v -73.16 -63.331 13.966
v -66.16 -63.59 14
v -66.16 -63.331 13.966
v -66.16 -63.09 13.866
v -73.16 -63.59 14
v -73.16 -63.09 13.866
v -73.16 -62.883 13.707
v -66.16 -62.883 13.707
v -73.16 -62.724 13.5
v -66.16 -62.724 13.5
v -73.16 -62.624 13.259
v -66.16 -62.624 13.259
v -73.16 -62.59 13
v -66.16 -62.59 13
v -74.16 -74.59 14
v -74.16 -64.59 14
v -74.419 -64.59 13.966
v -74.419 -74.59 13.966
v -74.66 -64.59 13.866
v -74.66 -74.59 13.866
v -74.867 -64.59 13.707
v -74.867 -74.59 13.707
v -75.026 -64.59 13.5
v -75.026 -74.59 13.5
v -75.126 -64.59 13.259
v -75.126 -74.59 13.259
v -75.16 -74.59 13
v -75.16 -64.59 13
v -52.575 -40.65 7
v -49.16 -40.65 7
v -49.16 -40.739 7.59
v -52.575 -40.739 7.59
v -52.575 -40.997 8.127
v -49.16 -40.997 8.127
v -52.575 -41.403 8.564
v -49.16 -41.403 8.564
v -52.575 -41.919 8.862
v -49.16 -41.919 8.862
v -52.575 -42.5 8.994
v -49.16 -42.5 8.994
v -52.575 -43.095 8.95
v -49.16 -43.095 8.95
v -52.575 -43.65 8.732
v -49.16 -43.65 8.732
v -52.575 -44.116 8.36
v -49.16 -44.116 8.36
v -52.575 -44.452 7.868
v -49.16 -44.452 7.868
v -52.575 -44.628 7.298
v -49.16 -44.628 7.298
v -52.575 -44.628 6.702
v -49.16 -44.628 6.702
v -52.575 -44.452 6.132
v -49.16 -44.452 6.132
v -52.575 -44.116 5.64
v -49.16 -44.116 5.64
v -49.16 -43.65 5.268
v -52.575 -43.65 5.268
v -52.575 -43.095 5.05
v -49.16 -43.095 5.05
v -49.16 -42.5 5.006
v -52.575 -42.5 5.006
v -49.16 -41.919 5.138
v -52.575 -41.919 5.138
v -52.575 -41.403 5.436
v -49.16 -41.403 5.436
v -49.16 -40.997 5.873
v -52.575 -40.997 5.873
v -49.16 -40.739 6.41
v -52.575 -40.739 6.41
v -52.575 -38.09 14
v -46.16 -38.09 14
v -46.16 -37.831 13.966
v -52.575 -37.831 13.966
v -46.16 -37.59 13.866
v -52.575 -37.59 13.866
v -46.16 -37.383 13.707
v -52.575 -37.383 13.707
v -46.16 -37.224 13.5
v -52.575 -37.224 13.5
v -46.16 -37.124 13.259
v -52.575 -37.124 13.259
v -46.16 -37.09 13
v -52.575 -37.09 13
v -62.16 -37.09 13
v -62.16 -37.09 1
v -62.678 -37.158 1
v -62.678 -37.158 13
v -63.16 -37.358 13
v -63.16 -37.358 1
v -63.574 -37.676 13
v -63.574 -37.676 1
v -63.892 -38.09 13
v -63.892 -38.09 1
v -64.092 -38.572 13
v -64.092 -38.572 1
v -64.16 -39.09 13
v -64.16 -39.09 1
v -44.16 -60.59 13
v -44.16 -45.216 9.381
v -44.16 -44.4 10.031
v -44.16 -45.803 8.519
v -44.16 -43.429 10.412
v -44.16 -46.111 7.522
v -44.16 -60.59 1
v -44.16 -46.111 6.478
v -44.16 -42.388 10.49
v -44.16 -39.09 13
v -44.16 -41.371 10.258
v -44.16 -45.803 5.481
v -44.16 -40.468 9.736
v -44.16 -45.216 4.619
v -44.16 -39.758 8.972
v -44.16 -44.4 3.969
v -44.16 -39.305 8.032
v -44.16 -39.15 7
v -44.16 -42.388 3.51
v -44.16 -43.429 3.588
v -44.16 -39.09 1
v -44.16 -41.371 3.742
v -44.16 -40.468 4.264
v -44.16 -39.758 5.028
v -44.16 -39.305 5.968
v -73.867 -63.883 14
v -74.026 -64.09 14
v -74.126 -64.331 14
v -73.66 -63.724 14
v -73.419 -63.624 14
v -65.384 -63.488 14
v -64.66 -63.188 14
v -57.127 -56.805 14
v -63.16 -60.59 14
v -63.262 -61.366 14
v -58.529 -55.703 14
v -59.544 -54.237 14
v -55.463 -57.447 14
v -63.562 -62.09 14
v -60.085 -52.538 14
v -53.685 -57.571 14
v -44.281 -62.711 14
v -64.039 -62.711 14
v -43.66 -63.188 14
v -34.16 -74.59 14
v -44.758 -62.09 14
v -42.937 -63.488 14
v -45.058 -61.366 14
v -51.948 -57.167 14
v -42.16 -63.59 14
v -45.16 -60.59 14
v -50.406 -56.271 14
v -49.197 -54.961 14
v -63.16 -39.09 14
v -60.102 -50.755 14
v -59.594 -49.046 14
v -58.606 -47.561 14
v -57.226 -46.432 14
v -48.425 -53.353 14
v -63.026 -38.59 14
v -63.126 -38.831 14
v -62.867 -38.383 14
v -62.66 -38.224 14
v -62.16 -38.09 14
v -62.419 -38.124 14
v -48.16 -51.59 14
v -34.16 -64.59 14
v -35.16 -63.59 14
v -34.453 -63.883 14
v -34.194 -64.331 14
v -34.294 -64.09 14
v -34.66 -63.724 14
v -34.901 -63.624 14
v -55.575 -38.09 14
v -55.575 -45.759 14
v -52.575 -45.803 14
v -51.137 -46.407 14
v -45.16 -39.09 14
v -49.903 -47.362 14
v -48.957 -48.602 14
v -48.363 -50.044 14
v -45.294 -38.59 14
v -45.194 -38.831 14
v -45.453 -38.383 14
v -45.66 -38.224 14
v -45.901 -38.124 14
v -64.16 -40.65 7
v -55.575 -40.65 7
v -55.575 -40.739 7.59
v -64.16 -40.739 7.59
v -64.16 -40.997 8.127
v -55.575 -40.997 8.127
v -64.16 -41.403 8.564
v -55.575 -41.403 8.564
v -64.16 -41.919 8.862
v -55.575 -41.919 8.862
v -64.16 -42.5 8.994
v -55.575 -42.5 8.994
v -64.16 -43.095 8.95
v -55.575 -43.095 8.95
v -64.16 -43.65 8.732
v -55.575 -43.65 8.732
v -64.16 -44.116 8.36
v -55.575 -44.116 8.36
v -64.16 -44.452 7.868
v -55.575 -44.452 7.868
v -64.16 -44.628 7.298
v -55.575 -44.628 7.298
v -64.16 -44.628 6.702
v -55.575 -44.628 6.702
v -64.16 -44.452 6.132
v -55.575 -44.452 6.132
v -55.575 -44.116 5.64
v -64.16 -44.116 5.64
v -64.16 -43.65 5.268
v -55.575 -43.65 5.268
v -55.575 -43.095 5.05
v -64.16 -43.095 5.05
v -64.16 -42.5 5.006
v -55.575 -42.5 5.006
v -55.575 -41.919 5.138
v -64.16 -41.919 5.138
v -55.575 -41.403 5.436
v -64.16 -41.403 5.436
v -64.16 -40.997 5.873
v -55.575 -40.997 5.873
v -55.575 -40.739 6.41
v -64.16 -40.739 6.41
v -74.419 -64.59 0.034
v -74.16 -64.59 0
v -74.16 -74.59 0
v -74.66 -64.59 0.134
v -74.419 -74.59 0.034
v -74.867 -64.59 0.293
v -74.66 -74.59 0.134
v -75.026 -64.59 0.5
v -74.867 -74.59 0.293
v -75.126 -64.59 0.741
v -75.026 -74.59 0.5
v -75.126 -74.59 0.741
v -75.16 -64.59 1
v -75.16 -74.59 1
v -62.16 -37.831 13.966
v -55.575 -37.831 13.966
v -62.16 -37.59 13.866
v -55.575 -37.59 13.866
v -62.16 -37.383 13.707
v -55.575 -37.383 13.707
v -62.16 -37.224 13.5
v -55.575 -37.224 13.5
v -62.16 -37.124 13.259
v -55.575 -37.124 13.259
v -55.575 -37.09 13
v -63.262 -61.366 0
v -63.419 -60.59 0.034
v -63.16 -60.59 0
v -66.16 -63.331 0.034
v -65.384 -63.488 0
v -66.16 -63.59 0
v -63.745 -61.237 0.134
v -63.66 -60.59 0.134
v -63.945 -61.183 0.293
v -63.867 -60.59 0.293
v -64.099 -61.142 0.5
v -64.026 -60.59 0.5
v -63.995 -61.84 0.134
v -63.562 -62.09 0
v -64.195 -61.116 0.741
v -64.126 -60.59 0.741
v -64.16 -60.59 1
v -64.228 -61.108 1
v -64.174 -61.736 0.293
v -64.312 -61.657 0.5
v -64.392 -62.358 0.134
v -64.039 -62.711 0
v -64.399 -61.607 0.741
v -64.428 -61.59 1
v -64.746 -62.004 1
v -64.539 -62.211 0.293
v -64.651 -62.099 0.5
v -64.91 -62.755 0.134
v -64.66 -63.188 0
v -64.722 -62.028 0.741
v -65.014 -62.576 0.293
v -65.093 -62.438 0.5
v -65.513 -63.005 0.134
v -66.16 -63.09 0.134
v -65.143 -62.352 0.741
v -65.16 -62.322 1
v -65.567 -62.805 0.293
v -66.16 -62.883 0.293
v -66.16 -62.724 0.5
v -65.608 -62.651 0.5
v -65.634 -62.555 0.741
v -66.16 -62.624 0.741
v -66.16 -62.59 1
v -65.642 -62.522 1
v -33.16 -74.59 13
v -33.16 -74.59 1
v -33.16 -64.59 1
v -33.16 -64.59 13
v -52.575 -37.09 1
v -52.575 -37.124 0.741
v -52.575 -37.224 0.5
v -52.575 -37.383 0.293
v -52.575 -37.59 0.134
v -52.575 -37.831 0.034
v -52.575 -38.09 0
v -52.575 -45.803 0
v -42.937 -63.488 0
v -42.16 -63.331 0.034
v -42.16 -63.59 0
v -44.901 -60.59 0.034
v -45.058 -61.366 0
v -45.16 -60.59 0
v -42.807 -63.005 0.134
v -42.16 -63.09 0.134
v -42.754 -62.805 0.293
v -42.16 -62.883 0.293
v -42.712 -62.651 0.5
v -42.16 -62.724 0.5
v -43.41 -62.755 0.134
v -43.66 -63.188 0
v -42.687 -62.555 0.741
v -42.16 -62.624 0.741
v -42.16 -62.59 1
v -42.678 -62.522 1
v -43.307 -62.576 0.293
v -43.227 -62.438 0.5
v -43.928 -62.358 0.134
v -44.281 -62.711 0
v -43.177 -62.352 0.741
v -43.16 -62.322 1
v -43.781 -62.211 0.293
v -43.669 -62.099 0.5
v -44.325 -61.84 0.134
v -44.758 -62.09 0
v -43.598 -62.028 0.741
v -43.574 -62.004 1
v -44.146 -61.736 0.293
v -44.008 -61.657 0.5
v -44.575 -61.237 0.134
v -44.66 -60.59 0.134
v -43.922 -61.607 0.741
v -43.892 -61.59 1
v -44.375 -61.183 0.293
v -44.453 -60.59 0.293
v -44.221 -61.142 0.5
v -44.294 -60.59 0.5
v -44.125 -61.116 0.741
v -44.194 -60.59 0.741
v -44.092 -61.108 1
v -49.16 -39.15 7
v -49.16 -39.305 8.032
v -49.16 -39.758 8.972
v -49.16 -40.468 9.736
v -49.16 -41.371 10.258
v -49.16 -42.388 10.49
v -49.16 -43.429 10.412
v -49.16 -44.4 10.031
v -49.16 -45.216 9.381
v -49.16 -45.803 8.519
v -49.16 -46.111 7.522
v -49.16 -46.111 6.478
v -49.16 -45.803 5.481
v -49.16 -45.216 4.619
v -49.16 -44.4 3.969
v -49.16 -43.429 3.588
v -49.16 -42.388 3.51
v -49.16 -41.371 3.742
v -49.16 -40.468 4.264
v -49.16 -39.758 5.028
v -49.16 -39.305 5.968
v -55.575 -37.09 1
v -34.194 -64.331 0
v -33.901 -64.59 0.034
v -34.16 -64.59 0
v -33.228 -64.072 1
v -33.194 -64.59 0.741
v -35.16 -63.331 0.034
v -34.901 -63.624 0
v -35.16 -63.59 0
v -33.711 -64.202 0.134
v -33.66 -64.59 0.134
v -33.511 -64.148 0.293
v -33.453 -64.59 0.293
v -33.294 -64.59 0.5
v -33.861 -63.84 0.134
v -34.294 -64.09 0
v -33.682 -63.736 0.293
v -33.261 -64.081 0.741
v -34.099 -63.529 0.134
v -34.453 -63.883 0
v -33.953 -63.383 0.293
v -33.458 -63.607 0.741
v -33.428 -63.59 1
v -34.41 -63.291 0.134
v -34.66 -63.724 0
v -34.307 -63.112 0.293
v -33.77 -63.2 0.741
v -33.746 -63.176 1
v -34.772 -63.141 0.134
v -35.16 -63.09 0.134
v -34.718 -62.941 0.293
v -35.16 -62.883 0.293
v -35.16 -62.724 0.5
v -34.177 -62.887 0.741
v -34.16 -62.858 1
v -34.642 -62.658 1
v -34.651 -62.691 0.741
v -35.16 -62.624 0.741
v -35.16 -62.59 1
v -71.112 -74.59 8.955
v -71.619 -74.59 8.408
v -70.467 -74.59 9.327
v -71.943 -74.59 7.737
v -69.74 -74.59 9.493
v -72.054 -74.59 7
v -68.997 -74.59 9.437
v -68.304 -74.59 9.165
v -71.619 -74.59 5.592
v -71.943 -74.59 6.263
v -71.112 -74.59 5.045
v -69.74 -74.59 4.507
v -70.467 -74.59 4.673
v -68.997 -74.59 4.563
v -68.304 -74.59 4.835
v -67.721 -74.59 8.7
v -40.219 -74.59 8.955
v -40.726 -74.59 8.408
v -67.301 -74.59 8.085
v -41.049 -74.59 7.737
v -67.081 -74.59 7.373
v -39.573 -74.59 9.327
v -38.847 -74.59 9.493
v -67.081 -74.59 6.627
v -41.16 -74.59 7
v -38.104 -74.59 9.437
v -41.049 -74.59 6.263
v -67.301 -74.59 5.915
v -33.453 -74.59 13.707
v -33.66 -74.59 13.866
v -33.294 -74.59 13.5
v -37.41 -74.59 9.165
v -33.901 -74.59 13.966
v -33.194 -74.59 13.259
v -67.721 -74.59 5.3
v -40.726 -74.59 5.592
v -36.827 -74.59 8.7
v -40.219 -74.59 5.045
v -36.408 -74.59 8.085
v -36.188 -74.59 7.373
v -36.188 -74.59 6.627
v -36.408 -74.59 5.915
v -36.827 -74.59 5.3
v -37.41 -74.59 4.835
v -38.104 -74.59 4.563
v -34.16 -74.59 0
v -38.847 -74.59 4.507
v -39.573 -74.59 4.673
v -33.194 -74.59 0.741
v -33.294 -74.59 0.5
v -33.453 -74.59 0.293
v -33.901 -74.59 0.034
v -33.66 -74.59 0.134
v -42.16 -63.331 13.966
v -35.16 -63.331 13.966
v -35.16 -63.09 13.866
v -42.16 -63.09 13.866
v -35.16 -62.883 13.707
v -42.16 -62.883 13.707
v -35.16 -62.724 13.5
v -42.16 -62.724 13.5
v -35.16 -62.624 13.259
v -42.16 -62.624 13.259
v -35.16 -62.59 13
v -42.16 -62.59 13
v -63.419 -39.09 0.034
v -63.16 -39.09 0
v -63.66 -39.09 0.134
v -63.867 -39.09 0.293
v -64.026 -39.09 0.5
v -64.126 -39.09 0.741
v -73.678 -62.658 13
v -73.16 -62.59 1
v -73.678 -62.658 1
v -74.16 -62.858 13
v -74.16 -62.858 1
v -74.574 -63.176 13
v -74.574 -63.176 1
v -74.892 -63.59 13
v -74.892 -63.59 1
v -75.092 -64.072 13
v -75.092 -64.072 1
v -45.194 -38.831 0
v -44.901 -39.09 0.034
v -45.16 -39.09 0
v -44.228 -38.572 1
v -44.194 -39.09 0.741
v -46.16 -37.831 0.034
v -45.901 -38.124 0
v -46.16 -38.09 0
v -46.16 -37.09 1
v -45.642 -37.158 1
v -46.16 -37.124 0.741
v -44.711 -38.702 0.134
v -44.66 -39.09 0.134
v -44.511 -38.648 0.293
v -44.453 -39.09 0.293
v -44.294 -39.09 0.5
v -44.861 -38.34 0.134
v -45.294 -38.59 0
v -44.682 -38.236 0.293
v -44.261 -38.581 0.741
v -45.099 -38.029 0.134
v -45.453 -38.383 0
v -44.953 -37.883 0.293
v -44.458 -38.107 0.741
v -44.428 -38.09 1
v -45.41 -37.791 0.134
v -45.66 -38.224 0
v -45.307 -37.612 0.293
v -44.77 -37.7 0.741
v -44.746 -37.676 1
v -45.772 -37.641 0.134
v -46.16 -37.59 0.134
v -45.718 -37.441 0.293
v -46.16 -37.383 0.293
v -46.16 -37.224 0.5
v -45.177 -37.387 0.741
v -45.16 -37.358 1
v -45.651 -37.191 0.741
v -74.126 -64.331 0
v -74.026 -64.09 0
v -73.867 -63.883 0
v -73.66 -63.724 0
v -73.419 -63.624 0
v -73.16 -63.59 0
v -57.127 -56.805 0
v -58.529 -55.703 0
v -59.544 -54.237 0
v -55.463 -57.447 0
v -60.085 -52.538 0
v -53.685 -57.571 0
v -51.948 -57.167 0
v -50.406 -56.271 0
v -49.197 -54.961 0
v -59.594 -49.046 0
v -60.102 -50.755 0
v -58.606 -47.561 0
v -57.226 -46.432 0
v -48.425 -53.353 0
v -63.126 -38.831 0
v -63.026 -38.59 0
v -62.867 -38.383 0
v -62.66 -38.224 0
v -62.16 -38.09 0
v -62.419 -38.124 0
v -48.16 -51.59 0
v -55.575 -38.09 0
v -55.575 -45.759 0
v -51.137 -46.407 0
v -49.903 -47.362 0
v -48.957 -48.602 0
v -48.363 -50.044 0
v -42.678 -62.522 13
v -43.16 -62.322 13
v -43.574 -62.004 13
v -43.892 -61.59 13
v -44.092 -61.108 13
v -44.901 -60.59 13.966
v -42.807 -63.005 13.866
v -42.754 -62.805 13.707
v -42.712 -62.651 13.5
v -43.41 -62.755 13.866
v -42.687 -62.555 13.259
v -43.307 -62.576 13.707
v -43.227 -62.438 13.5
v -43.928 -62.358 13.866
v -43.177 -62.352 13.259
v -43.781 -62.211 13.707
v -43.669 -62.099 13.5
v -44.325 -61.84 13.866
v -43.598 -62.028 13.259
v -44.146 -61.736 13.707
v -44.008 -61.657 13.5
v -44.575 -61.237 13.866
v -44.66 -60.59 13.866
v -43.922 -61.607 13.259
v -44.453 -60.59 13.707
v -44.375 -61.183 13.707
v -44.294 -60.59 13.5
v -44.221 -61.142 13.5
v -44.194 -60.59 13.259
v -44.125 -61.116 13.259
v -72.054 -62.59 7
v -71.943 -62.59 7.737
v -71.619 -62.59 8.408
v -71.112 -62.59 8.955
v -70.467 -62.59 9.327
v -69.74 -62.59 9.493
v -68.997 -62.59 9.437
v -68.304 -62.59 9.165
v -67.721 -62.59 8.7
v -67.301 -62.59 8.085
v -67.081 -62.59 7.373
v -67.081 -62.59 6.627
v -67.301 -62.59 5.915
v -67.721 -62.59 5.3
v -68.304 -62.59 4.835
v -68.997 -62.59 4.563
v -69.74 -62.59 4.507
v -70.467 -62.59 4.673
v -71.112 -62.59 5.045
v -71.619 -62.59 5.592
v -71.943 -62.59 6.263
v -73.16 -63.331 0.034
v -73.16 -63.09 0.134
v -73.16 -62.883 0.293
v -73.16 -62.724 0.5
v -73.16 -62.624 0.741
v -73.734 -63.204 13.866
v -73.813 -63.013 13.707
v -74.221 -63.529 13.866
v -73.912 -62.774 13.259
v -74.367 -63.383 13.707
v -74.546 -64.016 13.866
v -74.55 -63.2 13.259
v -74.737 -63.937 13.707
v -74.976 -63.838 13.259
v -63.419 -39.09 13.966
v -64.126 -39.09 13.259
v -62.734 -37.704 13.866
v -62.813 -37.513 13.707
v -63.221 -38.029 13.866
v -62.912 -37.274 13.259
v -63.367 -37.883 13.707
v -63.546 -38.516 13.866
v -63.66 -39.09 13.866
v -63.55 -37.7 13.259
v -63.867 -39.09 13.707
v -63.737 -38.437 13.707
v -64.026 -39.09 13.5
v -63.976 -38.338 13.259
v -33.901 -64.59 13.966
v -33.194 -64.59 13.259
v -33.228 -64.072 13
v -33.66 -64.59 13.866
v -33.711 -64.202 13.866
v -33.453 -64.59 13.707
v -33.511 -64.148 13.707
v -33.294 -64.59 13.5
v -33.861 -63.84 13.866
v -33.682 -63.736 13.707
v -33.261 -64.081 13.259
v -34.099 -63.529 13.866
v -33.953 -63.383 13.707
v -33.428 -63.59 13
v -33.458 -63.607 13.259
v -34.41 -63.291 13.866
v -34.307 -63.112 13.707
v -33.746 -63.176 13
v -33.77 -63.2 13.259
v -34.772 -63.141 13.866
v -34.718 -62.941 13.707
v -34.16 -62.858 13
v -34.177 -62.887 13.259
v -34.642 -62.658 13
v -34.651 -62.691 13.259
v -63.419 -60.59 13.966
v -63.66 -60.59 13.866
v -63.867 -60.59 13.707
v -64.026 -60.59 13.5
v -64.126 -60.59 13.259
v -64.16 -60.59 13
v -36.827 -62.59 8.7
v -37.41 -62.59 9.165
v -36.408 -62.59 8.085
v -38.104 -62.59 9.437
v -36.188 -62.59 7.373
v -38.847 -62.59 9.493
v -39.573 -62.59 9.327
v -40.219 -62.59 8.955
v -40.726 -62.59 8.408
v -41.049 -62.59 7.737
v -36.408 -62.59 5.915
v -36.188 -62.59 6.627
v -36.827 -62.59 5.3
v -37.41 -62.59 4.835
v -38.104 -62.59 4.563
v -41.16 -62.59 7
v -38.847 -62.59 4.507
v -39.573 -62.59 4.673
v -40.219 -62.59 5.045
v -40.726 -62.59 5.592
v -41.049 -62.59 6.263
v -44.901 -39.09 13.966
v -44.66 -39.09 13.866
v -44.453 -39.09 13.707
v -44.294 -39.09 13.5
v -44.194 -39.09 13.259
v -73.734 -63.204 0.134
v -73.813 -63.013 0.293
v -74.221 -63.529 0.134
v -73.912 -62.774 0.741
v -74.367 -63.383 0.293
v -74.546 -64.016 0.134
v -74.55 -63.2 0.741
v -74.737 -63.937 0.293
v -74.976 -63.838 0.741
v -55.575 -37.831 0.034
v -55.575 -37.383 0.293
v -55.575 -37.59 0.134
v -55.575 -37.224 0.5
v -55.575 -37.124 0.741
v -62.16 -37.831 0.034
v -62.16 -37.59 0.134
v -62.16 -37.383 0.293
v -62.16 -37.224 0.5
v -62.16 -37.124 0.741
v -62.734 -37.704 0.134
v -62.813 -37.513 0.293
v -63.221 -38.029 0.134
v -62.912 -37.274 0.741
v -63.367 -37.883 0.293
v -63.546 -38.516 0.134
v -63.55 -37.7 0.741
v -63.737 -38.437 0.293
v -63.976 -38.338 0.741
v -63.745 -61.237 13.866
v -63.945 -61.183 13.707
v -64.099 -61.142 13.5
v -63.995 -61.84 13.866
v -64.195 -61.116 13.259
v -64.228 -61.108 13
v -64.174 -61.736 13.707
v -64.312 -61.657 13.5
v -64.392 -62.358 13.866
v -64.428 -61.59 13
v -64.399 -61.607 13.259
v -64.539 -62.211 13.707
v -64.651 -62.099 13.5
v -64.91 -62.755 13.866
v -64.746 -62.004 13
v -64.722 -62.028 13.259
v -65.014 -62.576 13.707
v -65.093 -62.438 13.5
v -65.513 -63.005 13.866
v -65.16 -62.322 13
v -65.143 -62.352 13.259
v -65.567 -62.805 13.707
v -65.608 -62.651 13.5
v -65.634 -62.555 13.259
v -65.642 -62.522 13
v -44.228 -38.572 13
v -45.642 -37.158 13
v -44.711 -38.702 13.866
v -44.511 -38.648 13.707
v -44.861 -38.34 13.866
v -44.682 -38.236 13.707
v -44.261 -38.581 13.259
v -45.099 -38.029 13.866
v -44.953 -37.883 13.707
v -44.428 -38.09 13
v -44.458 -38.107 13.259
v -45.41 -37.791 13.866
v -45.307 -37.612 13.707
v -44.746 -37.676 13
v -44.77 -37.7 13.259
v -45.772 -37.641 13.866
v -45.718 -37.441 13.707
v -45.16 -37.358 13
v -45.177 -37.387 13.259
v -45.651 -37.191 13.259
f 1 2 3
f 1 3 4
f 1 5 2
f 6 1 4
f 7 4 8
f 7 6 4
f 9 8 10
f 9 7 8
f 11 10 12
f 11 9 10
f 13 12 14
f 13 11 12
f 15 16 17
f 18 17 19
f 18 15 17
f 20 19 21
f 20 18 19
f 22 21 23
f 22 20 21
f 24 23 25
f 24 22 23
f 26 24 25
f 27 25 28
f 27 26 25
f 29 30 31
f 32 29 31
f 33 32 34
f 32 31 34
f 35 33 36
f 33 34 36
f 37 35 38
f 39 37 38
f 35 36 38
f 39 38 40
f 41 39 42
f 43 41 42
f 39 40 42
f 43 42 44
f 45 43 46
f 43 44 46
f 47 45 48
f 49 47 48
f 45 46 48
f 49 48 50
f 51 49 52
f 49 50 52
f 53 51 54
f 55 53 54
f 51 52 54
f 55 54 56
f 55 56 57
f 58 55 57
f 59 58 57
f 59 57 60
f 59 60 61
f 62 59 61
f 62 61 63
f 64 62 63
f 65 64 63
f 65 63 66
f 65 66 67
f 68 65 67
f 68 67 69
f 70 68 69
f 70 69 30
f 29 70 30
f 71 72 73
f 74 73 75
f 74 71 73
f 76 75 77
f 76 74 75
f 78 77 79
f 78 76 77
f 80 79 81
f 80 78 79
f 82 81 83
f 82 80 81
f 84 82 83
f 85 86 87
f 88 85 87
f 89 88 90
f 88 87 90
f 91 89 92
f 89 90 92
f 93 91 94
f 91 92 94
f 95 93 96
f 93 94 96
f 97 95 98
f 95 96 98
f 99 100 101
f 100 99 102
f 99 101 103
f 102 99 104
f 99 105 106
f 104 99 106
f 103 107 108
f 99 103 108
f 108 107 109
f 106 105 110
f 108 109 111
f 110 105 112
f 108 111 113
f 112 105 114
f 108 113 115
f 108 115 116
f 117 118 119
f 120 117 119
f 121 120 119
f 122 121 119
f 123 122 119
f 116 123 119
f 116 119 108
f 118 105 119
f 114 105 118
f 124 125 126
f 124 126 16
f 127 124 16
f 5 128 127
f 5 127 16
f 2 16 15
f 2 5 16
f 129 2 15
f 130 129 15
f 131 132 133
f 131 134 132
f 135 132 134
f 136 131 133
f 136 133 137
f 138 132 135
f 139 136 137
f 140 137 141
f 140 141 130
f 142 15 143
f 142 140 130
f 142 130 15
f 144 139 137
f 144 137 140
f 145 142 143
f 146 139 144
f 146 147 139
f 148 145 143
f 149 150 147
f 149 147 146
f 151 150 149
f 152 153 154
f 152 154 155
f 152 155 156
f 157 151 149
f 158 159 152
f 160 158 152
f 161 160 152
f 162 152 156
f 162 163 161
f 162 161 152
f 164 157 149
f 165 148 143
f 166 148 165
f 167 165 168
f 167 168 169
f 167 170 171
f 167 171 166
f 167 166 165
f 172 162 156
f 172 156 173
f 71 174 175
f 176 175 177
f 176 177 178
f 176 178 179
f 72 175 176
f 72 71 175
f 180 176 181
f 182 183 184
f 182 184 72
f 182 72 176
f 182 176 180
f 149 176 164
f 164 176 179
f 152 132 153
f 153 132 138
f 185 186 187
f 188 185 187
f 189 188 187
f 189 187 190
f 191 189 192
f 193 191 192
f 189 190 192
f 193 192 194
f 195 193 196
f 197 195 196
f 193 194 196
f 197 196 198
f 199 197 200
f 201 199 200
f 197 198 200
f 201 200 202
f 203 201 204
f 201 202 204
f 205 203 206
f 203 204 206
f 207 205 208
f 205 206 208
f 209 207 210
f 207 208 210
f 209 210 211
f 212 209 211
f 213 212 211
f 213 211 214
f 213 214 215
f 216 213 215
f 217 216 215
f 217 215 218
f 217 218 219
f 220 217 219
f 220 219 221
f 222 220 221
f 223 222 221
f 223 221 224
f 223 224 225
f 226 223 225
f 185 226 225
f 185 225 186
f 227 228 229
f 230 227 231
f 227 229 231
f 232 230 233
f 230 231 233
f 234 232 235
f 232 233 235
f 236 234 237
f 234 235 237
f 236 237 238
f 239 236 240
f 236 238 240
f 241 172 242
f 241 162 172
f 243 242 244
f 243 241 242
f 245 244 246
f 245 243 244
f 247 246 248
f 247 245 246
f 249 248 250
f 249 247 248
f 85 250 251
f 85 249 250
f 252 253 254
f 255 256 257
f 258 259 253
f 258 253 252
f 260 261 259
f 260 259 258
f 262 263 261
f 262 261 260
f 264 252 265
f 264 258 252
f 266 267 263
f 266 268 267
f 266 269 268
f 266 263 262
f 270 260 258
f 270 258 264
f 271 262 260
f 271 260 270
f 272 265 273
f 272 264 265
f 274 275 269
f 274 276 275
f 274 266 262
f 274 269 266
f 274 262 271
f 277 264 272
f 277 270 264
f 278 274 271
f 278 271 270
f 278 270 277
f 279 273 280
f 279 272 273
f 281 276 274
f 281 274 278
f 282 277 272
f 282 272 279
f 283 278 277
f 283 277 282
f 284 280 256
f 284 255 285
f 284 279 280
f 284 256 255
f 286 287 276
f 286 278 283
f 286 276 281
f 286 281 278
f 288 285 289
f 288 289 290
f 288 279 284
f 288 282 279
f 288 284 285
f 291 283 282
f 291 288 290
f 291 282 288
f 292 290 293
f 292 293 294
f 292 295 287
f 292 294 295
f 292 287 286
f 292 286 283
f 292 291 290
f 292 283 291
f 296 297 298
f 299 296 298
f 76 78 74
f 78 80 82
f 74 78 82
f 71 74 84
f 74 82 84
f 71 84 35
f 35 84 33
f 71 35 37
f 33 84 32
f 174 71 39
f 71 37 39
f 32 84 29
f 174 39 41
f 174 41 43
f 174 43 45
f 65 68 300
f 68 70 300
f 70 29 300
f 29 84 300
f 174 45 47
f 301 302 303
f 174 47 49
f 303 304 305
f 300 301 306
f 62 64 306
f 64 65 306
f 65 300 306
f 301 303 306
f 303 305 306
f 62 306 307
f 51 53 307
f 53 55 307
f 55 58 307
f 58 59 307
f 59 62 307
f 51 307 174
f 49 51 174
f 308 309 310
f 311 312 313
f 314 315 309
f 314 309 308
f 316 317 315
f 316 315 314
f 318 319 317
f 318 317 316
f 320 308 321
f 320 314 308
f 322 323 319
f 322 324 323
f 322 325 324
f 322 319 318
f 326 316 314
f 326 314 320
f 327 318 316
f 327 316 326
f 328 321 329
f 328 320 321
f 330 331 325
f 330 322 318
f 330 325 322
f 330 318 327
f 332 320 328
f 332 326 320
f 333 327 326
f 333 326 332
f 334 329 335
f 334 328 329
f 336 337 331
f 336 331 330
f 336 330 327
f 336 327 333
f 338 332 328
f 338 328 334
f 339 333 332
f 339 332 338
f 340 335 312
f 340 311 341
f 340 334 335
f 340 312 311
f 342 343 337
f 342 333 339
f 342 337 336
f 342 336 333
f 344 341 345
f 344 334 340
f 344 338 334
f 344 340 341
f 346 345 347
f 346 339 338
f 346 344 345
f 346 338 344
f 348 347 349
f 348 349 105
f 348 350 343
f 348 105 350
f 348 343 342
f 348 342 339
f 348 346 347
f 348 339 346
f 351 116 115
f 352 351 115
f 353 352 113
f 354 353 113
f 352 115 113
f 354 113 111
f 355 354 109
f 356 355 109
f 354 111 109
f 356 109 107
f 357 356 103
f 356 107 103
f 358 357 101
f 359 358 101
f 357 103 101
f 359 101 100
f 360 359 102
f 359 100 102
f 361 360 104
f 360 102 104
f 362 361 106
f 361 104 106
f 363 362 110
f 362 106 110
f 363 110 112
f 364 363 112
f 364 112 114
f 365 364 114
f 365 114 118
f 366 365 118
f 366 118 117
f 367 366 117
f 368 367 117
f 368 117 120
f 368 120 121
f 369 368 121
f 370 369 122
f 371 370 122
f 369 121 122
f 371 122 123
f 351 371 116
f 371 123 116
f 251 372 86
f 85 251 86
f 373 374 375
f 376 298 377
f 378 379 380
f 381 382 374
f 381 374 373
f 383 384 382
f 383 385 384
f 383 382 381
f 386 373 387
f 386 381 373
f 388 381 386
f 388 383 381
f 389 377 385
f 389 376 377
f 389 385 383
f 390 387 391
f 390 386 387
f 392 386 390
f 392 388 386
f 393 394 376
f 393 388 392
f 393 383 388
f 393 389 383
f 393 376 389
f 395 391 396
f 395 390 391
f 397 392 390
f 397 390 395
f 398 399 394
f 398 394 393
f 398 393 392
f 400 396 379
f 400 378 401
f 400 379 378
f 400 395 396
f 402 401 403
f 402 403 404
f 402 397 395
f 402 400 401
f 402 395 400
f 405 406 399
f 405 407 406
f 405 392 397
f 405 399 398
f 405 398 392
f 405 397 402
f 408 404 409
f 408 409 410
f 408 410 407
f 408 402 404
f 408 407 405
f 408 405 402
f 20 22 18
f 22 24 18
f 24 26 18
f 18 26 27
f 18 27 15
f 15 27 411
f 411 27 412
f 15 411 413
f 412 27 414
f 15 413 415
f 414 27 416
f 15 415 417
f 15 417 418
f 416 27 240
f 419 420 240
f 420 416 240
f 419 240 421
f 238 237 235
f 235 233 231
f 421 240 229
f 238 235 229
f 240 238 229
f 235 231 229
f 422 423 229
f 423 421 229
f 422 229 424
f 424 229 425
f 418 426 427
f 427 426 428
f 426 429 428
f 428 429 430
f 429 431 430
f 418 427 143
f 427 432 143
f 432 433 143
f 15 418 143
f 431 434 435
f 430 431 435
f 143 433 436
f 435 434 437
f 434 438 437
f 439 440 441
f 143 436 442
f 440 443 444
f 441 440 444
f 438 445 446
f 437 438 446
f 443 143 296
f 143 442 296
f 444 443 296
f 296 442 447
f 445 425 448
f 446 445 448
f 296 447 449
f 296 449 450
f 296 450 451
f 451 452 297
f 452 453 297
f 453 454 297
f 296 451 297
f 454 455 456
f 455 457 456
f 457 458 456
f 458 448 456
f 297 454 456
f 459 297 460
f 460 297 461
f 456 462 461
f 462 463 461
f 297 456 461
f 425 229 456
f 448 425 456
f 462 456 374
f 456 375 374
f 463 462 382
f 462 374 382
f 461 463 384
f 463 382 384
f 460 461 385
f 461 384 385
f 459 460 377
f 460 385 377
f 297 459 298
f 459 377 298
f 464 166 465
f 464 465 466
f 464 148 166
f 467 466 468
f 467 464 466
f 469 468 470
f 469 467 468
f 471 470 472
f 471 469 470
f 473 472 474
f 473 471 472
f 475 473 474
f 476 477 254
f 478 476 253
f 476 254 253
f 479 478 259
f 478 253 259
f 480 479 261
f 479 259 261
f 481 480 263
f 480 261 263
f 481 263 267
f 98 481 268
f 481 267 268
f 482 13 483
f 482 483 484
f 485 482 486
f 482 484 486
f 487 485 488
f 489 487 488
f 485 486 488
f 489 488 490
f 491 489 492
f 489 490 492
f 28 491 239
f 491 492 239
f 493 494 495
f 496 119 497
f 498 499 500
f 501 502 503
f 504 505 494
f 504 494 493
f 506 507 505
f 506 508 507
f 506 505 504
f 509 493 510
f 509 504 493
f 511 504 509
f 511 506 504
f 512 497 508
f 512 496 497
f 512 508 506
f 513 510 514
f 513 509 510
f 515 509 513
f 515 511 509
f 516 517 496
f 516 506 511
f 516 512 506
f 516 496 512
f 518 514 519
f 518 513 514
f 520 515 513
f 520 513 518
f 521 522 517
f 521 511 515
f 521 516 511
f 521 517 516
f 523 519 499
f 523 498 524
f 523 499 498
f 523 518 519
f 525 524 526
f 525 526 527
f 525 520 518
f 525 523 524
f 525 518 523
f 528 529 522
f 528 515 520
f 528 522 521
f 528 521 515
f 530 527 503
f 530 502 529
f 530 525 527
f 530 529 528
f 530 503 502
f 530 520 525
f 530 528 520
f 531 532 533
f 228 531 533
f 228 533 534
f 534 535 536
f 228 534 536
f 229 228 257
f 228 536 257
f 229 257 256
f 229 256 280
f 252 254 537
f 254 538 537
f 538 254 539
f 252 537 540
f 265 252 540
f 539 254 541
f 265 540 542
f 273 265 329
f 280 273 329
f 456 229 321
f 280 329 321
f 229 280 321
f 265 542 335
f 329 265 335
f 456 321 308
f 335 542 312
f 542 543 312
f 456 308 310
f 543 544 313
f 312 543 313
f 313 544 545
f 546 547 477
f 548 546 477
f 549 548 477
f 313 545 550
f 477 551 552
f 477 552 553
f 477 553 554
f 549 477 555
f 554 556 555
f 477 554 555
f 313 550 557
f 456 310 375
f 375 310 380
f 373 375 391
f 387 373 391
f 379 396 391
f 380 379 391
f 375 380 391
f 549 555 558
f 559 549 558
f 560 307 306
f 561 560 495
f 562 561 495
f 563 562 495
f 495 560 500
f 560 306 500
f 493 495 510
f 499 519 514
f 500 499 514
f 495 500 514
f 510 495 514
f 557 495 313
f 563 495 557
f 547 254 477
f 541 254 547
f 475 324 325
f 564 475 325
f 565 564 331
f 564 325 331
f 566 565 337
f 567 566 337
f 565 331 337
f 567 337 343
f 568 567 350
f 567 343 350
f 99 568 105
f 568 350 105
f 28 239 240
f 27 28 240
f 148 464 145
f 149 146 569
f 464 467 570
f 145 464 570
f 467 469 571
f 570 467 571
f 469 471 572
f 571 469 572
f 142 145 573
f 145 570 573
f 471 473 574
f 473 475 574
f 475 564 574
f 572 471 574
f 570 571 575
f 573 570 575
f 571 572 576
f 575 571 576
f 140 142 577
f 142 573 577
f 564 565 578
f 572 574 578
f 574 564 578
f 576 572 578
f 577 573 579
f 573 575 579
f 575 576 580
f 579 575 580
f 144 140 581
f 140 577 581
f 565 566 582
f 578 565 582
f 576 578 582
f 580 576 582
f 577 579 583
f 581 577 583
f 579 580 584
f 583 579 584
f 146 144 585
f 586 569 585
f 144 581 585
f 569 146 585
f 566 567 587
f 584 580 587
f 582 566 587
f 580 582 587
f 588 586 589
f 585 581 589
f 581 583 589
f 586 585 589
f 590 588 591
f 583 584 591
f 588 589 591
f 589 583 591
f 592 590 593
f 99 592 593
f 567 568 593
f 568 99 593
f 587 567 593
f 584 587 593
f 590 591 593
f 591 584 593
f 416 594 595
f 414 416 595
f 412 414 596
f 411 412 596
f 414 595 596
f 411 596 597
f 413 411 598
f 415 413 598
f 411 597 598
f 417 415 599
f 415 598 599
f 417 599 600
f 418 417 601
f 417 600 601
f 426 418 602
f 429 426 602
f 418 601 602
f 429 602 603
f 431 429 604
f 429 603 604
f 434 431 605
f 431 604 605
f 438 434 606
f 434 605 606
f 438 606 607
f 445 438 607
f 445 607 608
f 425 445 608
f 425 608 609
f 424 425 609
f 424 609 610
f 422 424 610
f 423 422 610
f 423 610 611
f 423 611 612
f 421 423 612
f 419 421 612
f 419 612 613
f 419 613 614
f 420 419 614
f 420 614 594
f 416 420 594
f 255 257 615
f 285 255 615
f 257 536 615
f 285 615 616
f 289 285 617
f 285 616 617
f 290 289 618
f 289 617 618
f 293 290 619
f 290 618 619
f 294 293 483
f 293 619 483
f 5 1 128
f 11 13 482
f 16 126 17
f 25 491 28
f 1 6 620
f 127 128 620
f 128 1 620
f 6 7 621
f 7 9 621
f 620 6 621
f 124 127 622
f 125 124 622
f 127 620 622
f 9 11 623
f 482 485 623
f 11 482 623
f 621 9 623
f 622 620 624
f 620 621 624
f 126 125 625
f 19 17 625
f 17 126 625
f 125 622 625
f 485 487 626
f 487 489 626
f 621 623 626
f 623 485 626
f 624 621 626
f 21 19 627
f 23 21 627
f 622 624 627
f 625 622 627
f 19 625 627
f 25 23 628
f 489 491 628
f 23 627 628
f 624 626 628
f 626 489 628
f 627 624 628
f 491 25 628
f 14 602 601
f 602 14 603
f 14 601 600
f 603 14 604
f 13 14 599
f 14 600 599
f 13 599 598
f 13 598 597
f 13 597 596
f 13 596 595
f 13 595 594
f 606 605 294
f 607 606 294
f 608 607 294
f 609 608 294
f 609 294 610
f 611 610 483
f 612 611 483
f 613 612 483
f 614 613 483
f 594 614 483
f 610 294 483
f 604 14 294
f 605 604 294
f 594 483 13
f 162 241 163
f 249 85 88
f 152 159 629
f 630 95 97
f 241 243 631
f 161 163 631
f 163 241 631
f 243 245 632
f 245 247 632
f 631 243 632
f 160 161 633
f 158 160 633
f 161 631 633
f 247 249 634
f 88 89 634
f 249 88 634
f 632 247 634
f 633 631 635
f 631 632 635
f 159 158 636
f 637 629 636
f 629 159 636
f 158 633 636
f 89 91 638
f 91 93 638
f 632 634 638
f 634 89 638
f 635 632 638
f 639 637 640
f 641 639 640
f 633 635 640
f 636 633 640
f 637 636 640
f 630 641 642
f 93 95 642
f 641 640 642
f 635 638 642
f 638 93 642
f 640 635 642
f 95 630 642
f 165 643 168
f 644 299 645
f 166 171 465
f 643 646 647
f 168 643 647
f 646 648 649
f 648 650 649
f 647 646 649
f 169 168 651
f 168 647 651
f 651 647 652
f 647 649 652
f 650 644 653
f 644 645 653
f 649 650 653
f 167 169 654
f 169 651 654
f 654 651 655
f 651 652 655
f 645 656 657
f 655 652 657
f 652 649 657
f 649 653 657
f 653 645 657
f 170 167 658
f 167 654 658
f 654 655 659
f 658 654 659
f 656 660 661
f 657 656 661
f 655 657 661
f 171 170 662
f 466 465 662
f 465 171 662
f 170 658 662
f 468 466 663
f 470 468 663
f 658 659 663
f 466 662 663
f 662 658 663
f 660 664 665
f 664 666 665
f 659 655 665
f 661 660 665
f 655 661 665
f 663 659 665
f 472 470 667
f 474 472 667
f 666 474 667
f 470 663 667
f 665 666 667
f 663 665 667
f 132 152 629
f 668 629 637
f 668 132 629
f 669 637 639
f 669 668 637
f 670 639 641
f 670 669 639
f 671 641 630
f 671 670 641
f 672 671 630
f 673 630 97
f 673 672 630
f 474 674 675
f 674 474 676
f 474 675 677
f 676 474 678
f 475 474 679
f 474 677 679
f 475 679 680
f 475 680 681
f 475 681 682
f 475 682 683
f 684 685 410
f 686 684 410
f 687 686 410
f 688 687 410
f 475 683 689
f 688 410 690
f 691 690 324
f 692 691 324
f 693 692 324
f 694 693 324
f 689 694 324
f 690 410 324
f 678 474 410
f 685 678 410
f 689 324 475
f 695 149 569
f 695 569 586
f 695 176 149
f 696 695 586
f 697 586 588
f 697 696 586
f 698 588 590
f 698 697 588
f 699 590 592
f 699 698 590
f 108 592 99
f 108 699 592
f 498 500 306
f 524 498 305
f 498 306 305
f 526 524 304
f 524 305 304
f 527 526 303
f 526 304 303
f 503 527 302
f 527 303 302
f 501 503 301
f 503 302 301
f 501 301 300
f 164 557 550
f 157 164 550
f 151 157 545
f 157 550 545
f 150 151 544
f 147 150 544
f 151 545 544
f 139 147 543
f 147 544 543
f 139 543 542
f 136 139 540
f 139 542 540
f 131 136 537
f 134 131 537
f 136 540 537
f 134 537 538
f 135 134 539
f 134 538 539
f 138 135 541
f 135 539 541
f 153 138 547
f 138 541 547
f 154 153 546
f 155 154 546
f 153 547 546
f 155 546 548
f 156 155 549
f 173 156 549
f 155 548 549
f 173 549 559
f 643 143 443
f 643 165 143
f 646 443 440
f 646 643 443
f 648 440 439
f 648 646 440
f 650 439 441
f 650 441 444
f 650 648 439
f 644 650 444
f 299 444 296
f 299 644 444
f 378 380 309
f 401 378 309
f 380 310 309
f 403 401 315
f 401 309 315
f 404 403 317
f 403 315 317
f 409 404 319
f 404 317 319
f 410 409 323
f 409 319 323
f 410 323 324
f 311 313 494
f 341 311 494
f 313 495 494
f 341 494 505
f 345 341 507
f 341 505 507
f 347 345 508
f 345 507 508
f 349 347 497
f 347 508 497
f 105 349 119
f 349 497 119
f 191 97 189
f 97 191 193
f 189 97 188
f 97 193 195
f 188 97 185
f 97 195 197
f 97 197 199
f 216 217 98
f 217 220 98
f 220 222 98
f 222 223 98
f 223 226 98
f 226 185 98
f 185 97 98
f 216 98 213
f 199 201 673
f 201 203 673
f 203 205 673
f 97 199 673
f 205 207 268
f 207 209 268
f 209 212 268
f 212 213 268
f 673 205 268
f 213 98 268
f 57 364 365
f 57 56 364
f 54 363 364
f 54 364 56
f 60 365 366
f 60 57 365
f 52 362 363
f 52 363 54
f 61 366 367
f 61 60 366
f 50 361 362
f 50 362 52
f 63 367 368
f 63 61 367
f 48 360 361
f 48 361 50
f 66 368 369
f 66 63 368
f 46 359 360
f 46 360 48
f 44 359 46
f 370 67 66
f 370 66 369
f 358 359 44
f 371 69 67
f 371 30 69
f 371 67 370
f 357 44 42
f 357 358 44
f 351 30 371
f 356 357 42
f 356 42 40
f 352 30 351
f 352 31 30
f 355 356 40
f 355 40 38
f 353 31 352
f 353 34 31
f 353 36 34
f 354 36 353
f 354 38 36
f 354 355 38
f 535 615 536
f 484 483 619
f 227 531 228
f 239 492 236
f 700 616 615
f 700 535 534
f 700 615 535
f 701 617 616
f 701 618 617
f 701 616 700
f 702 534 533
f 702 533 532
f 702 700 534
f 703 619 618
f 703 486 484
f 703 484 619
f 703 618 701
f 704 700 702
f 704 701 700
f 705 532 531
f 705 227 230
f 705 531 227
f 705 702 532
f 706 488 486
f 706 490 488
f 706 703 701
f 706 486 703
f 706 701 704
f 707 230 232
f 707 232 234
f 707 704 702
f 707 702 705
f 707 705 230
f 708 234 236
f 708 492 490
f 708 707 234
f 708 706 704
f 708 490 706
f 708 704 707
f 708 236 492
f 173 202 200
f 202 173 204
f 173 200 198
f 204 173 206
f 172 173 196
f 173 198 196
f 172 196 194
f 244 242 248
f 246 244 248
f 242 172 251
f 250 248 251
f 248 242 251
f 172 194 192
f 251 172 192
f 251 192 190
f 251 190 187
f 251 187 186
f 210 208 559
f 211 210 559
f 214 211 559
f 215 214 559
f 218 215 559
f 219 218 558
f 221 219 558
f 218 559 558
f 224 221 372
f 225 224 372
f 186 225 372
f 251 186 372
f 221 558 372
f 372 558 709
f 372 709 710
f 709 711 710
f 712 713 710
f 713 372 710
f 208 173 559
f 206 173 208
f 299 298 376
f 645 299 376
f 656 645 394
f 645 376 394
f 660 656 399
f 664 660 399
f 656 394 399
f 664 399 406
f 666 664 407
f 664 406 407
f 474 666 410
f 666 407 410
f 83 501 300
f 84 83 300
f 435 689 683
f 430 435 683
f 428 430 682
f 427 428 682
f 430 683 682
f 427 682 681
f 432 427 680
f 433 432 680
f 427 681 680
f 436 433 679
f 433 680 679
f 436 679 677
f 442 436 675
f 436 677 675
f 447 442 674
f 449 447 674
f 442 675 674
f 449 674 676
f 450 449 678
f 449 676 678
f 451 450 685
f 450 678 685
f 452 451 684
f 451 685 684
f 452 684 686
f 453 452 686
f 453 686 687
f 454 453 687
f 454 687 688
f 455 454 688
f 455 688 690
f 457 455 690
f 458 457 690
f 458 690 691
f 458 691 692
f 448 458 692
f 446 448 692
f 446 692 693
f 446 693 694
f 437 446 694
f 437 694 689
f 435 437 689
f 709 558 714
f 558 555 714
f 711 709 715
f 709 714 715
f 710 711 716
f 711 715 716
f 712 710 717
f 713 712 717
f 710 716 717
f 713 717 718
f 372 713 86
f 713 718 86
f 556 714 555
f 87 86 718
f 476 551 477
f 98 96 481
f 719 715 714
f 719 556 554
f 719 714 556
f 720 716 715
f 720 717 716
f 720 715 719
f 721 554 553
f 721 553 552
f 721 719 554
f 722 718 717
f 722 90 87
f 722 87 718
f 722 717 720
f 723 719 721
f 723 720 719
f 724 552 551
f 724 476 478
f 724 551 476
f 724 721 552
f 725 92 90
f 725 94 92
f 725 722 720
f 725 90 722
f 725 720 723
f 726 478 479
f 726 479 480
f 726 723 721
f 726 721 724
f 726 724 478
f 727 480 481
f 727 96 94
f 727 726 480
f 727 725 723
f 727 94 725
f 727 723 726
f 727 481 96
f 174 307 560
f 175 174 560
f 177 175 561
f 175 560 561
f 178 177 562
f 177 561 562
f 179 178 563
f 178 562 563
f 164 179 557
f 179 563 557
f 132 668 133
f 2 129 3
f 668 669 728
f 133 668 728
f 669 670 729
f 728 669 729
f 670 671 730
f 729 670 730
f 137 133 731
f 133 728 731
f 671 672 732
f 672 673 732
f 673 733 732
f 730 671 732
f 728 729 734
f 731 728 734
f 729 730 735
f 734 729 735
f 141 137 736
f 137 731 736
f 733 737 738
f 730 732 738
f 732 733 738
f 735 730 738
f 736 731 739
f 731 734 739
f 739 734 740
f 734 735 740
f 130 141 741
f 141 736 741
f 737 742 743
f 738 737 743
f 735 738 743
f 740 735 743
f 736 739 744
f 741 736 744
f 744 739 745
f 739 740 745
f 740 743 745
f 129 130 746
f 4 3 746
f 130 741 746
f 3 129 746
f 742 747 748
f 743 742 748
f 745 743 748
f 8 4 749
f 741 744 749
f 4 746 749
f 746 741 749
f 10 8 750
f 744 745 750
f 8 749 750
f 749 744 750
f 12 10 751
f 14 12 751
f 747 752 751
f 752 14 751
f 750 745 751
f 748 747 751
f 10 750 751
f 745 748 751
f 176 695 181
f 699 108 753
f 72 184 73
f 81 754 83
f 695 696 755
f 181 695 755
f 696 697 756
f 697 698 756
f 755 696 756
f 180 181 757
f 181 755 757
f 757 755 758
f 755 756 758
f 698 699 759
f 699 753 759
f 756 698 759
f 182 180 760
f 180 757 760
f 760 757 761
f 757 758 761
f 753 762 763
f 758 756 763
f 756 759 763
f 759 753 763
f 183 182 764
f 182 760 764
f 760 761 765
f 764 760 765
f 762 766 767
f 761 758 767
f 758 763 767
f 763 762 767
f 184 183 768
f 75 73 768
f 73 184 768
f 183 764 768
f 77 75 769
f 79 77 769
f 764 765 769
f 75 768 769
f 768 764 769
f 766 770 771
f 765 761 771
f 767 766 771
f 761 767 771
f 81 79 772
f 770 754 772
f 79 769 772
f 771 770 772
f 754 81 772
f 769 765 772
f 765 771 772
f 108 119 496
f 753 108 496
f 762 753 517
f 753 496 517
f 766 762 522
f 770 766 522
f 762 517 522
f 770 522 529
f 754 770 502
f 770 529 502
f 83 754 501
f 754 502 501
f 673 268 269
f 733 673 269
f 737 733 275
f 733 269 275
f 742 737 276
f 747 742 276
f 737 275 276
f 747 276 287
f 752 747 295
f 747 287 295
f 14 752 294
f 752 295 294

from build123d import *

# Parameters (mm, degrees)
F1_DEPTH = 14
F2_R     = 3.5
F2_R_2   = 2
F3_DEPTH = 5
F4_DEPTH = 25
F5_R     = 2.5
F6_DEPTH = 25
F7_R     = 1


with BuildPart() as f1:
    # F0 (on Top) → F1 (new body)
    with BuildSketch(Plane.XY):
        with BuildLine():
            Line((-75.1601234078, -64.5899677277), (-75.1601234078, -74.5899677277))
            Line((-75.1601234078, -74.5899677277), (-33.1601234078, -74.5899677277))
            Line((-33.1601234078, -74.5899677277), (-33.1601234078, -64.5899677277))
            ThreePointArc((-33.1601234078, -64.5899677277), (-33.7459098455, -63.1757541653), (-35.1601234078, -62.5899677277))
            Line((-35.1601234078, -62.5899677277), (-42.1601234078, -62.5899677277))
            ThreePointArc((-42.1601234078, -62.5899677277), (-43.5743369702, -62.00418129), (-44.1601234078, -60.5899677277))
            Line((-44.1601234078, -60.5899677277), (-44.1601234078, -39.0899677277))
            ThreePointArc((-44.1601234078, -39.0899677277), (-44.7459098455, -37.6757541653), (-46.1601234078, -37.0899677277))
            Line((-46.1601234078, -37.0899677277), (-52.5748137326, -37.0899677277))
            Line((-52.5748137326, -37.0899677277), (-52.5748137326, -45.8031902796))
            ThreePointArc((-52.5748137326, -45.8031902796), (-49.3898059105, -47.9507272885), (-48.1601234078, -51.5899677277))
            ThreePointArc((-48.1601234078, -51.5899677277), (-57.8690220349, -56.3063297763), (-55.5748137326, -45.7591314853))
            Line((-55.5748137326, -45.7591314853), (-55.5748137326, -37.0899677277))
            Line((-55.5748137326, -37.0899677277), (-62.1601234078, -37.0899677277))
            ThreePointArc((-62.1601234078, -37.0899677277), (-63.5743369702, -37.6757541653), (-64.1601234078, -39.0899677277))
            Line((-64.1601234078, -39.0899677277), (-64.1601234078, -60.5899677277))
            ThreePointArc((-64.1601234078, -60.5899677277), (-64.7459098455, -62.00418129), (-66.1601234078, -62.5899677277))
            Line((-66.1601234078, -62.5899677277), (-73.1601234078, -62.5899677277))
            ThreePointArc((-73.1601234078, -62.5899677277), (-74.5743369702, -63.1757541653), (-75.1601234078, -64.5899677277))
        make_face()
    extrude(amount=F1_DEPTH)

    # F2 (on face) → F3 (cut)
    with BuildSketch(Plane.YZ.offset(-44.1601234078)):
        with Locations((-42.6499210298, 7)):
            Circle(F2_R)
        with Locations((-42.6499210298, 7)):
            Circle(F2_R_2, mode=Mode.SUBTRACT)
    extrude(amount=-F3_DEPTH, mode=Mode.SUBTRACT)

    # F4 (cut): a face of the model
    f4_faces = [f1.faces().sort_by_distance(p)[0] for p in [
        (-44.1601234078, -42.6499210298, 7),
    ]]
    extrude(f4_faces, amount=-F4_DEPTH, mode=Mode.SUBTRACT)

    # F5 (on face) → F6 (cut)
    with BuildSketch(Plane(origin=(0, -62.5899677277, 0), x_dir=(-1, 0, 0), z_dir=(0, 1, 0))):
        with Locations((38.6601234078, 7)):
            Circle(F5_R)
        with Locations((69.5535764098, 7)):
            Circle(F5_R)
    extrude(amount=-F6_DEPTH, mode=Mode.SUBTRACT)

    # F7
    f7_edges = [f1.edges().sort_by_distance(p)[0] for p in [
        (-44.160123, -49.839968, 14),
        (-64.160123, -49.839968, 14),
        (-44.160123, -49.839968, 0),
        (-64.160123, -49.839968, 0),
    ]]
    fillet(f7_edges, radius=F7_R)


solid = f1.part
